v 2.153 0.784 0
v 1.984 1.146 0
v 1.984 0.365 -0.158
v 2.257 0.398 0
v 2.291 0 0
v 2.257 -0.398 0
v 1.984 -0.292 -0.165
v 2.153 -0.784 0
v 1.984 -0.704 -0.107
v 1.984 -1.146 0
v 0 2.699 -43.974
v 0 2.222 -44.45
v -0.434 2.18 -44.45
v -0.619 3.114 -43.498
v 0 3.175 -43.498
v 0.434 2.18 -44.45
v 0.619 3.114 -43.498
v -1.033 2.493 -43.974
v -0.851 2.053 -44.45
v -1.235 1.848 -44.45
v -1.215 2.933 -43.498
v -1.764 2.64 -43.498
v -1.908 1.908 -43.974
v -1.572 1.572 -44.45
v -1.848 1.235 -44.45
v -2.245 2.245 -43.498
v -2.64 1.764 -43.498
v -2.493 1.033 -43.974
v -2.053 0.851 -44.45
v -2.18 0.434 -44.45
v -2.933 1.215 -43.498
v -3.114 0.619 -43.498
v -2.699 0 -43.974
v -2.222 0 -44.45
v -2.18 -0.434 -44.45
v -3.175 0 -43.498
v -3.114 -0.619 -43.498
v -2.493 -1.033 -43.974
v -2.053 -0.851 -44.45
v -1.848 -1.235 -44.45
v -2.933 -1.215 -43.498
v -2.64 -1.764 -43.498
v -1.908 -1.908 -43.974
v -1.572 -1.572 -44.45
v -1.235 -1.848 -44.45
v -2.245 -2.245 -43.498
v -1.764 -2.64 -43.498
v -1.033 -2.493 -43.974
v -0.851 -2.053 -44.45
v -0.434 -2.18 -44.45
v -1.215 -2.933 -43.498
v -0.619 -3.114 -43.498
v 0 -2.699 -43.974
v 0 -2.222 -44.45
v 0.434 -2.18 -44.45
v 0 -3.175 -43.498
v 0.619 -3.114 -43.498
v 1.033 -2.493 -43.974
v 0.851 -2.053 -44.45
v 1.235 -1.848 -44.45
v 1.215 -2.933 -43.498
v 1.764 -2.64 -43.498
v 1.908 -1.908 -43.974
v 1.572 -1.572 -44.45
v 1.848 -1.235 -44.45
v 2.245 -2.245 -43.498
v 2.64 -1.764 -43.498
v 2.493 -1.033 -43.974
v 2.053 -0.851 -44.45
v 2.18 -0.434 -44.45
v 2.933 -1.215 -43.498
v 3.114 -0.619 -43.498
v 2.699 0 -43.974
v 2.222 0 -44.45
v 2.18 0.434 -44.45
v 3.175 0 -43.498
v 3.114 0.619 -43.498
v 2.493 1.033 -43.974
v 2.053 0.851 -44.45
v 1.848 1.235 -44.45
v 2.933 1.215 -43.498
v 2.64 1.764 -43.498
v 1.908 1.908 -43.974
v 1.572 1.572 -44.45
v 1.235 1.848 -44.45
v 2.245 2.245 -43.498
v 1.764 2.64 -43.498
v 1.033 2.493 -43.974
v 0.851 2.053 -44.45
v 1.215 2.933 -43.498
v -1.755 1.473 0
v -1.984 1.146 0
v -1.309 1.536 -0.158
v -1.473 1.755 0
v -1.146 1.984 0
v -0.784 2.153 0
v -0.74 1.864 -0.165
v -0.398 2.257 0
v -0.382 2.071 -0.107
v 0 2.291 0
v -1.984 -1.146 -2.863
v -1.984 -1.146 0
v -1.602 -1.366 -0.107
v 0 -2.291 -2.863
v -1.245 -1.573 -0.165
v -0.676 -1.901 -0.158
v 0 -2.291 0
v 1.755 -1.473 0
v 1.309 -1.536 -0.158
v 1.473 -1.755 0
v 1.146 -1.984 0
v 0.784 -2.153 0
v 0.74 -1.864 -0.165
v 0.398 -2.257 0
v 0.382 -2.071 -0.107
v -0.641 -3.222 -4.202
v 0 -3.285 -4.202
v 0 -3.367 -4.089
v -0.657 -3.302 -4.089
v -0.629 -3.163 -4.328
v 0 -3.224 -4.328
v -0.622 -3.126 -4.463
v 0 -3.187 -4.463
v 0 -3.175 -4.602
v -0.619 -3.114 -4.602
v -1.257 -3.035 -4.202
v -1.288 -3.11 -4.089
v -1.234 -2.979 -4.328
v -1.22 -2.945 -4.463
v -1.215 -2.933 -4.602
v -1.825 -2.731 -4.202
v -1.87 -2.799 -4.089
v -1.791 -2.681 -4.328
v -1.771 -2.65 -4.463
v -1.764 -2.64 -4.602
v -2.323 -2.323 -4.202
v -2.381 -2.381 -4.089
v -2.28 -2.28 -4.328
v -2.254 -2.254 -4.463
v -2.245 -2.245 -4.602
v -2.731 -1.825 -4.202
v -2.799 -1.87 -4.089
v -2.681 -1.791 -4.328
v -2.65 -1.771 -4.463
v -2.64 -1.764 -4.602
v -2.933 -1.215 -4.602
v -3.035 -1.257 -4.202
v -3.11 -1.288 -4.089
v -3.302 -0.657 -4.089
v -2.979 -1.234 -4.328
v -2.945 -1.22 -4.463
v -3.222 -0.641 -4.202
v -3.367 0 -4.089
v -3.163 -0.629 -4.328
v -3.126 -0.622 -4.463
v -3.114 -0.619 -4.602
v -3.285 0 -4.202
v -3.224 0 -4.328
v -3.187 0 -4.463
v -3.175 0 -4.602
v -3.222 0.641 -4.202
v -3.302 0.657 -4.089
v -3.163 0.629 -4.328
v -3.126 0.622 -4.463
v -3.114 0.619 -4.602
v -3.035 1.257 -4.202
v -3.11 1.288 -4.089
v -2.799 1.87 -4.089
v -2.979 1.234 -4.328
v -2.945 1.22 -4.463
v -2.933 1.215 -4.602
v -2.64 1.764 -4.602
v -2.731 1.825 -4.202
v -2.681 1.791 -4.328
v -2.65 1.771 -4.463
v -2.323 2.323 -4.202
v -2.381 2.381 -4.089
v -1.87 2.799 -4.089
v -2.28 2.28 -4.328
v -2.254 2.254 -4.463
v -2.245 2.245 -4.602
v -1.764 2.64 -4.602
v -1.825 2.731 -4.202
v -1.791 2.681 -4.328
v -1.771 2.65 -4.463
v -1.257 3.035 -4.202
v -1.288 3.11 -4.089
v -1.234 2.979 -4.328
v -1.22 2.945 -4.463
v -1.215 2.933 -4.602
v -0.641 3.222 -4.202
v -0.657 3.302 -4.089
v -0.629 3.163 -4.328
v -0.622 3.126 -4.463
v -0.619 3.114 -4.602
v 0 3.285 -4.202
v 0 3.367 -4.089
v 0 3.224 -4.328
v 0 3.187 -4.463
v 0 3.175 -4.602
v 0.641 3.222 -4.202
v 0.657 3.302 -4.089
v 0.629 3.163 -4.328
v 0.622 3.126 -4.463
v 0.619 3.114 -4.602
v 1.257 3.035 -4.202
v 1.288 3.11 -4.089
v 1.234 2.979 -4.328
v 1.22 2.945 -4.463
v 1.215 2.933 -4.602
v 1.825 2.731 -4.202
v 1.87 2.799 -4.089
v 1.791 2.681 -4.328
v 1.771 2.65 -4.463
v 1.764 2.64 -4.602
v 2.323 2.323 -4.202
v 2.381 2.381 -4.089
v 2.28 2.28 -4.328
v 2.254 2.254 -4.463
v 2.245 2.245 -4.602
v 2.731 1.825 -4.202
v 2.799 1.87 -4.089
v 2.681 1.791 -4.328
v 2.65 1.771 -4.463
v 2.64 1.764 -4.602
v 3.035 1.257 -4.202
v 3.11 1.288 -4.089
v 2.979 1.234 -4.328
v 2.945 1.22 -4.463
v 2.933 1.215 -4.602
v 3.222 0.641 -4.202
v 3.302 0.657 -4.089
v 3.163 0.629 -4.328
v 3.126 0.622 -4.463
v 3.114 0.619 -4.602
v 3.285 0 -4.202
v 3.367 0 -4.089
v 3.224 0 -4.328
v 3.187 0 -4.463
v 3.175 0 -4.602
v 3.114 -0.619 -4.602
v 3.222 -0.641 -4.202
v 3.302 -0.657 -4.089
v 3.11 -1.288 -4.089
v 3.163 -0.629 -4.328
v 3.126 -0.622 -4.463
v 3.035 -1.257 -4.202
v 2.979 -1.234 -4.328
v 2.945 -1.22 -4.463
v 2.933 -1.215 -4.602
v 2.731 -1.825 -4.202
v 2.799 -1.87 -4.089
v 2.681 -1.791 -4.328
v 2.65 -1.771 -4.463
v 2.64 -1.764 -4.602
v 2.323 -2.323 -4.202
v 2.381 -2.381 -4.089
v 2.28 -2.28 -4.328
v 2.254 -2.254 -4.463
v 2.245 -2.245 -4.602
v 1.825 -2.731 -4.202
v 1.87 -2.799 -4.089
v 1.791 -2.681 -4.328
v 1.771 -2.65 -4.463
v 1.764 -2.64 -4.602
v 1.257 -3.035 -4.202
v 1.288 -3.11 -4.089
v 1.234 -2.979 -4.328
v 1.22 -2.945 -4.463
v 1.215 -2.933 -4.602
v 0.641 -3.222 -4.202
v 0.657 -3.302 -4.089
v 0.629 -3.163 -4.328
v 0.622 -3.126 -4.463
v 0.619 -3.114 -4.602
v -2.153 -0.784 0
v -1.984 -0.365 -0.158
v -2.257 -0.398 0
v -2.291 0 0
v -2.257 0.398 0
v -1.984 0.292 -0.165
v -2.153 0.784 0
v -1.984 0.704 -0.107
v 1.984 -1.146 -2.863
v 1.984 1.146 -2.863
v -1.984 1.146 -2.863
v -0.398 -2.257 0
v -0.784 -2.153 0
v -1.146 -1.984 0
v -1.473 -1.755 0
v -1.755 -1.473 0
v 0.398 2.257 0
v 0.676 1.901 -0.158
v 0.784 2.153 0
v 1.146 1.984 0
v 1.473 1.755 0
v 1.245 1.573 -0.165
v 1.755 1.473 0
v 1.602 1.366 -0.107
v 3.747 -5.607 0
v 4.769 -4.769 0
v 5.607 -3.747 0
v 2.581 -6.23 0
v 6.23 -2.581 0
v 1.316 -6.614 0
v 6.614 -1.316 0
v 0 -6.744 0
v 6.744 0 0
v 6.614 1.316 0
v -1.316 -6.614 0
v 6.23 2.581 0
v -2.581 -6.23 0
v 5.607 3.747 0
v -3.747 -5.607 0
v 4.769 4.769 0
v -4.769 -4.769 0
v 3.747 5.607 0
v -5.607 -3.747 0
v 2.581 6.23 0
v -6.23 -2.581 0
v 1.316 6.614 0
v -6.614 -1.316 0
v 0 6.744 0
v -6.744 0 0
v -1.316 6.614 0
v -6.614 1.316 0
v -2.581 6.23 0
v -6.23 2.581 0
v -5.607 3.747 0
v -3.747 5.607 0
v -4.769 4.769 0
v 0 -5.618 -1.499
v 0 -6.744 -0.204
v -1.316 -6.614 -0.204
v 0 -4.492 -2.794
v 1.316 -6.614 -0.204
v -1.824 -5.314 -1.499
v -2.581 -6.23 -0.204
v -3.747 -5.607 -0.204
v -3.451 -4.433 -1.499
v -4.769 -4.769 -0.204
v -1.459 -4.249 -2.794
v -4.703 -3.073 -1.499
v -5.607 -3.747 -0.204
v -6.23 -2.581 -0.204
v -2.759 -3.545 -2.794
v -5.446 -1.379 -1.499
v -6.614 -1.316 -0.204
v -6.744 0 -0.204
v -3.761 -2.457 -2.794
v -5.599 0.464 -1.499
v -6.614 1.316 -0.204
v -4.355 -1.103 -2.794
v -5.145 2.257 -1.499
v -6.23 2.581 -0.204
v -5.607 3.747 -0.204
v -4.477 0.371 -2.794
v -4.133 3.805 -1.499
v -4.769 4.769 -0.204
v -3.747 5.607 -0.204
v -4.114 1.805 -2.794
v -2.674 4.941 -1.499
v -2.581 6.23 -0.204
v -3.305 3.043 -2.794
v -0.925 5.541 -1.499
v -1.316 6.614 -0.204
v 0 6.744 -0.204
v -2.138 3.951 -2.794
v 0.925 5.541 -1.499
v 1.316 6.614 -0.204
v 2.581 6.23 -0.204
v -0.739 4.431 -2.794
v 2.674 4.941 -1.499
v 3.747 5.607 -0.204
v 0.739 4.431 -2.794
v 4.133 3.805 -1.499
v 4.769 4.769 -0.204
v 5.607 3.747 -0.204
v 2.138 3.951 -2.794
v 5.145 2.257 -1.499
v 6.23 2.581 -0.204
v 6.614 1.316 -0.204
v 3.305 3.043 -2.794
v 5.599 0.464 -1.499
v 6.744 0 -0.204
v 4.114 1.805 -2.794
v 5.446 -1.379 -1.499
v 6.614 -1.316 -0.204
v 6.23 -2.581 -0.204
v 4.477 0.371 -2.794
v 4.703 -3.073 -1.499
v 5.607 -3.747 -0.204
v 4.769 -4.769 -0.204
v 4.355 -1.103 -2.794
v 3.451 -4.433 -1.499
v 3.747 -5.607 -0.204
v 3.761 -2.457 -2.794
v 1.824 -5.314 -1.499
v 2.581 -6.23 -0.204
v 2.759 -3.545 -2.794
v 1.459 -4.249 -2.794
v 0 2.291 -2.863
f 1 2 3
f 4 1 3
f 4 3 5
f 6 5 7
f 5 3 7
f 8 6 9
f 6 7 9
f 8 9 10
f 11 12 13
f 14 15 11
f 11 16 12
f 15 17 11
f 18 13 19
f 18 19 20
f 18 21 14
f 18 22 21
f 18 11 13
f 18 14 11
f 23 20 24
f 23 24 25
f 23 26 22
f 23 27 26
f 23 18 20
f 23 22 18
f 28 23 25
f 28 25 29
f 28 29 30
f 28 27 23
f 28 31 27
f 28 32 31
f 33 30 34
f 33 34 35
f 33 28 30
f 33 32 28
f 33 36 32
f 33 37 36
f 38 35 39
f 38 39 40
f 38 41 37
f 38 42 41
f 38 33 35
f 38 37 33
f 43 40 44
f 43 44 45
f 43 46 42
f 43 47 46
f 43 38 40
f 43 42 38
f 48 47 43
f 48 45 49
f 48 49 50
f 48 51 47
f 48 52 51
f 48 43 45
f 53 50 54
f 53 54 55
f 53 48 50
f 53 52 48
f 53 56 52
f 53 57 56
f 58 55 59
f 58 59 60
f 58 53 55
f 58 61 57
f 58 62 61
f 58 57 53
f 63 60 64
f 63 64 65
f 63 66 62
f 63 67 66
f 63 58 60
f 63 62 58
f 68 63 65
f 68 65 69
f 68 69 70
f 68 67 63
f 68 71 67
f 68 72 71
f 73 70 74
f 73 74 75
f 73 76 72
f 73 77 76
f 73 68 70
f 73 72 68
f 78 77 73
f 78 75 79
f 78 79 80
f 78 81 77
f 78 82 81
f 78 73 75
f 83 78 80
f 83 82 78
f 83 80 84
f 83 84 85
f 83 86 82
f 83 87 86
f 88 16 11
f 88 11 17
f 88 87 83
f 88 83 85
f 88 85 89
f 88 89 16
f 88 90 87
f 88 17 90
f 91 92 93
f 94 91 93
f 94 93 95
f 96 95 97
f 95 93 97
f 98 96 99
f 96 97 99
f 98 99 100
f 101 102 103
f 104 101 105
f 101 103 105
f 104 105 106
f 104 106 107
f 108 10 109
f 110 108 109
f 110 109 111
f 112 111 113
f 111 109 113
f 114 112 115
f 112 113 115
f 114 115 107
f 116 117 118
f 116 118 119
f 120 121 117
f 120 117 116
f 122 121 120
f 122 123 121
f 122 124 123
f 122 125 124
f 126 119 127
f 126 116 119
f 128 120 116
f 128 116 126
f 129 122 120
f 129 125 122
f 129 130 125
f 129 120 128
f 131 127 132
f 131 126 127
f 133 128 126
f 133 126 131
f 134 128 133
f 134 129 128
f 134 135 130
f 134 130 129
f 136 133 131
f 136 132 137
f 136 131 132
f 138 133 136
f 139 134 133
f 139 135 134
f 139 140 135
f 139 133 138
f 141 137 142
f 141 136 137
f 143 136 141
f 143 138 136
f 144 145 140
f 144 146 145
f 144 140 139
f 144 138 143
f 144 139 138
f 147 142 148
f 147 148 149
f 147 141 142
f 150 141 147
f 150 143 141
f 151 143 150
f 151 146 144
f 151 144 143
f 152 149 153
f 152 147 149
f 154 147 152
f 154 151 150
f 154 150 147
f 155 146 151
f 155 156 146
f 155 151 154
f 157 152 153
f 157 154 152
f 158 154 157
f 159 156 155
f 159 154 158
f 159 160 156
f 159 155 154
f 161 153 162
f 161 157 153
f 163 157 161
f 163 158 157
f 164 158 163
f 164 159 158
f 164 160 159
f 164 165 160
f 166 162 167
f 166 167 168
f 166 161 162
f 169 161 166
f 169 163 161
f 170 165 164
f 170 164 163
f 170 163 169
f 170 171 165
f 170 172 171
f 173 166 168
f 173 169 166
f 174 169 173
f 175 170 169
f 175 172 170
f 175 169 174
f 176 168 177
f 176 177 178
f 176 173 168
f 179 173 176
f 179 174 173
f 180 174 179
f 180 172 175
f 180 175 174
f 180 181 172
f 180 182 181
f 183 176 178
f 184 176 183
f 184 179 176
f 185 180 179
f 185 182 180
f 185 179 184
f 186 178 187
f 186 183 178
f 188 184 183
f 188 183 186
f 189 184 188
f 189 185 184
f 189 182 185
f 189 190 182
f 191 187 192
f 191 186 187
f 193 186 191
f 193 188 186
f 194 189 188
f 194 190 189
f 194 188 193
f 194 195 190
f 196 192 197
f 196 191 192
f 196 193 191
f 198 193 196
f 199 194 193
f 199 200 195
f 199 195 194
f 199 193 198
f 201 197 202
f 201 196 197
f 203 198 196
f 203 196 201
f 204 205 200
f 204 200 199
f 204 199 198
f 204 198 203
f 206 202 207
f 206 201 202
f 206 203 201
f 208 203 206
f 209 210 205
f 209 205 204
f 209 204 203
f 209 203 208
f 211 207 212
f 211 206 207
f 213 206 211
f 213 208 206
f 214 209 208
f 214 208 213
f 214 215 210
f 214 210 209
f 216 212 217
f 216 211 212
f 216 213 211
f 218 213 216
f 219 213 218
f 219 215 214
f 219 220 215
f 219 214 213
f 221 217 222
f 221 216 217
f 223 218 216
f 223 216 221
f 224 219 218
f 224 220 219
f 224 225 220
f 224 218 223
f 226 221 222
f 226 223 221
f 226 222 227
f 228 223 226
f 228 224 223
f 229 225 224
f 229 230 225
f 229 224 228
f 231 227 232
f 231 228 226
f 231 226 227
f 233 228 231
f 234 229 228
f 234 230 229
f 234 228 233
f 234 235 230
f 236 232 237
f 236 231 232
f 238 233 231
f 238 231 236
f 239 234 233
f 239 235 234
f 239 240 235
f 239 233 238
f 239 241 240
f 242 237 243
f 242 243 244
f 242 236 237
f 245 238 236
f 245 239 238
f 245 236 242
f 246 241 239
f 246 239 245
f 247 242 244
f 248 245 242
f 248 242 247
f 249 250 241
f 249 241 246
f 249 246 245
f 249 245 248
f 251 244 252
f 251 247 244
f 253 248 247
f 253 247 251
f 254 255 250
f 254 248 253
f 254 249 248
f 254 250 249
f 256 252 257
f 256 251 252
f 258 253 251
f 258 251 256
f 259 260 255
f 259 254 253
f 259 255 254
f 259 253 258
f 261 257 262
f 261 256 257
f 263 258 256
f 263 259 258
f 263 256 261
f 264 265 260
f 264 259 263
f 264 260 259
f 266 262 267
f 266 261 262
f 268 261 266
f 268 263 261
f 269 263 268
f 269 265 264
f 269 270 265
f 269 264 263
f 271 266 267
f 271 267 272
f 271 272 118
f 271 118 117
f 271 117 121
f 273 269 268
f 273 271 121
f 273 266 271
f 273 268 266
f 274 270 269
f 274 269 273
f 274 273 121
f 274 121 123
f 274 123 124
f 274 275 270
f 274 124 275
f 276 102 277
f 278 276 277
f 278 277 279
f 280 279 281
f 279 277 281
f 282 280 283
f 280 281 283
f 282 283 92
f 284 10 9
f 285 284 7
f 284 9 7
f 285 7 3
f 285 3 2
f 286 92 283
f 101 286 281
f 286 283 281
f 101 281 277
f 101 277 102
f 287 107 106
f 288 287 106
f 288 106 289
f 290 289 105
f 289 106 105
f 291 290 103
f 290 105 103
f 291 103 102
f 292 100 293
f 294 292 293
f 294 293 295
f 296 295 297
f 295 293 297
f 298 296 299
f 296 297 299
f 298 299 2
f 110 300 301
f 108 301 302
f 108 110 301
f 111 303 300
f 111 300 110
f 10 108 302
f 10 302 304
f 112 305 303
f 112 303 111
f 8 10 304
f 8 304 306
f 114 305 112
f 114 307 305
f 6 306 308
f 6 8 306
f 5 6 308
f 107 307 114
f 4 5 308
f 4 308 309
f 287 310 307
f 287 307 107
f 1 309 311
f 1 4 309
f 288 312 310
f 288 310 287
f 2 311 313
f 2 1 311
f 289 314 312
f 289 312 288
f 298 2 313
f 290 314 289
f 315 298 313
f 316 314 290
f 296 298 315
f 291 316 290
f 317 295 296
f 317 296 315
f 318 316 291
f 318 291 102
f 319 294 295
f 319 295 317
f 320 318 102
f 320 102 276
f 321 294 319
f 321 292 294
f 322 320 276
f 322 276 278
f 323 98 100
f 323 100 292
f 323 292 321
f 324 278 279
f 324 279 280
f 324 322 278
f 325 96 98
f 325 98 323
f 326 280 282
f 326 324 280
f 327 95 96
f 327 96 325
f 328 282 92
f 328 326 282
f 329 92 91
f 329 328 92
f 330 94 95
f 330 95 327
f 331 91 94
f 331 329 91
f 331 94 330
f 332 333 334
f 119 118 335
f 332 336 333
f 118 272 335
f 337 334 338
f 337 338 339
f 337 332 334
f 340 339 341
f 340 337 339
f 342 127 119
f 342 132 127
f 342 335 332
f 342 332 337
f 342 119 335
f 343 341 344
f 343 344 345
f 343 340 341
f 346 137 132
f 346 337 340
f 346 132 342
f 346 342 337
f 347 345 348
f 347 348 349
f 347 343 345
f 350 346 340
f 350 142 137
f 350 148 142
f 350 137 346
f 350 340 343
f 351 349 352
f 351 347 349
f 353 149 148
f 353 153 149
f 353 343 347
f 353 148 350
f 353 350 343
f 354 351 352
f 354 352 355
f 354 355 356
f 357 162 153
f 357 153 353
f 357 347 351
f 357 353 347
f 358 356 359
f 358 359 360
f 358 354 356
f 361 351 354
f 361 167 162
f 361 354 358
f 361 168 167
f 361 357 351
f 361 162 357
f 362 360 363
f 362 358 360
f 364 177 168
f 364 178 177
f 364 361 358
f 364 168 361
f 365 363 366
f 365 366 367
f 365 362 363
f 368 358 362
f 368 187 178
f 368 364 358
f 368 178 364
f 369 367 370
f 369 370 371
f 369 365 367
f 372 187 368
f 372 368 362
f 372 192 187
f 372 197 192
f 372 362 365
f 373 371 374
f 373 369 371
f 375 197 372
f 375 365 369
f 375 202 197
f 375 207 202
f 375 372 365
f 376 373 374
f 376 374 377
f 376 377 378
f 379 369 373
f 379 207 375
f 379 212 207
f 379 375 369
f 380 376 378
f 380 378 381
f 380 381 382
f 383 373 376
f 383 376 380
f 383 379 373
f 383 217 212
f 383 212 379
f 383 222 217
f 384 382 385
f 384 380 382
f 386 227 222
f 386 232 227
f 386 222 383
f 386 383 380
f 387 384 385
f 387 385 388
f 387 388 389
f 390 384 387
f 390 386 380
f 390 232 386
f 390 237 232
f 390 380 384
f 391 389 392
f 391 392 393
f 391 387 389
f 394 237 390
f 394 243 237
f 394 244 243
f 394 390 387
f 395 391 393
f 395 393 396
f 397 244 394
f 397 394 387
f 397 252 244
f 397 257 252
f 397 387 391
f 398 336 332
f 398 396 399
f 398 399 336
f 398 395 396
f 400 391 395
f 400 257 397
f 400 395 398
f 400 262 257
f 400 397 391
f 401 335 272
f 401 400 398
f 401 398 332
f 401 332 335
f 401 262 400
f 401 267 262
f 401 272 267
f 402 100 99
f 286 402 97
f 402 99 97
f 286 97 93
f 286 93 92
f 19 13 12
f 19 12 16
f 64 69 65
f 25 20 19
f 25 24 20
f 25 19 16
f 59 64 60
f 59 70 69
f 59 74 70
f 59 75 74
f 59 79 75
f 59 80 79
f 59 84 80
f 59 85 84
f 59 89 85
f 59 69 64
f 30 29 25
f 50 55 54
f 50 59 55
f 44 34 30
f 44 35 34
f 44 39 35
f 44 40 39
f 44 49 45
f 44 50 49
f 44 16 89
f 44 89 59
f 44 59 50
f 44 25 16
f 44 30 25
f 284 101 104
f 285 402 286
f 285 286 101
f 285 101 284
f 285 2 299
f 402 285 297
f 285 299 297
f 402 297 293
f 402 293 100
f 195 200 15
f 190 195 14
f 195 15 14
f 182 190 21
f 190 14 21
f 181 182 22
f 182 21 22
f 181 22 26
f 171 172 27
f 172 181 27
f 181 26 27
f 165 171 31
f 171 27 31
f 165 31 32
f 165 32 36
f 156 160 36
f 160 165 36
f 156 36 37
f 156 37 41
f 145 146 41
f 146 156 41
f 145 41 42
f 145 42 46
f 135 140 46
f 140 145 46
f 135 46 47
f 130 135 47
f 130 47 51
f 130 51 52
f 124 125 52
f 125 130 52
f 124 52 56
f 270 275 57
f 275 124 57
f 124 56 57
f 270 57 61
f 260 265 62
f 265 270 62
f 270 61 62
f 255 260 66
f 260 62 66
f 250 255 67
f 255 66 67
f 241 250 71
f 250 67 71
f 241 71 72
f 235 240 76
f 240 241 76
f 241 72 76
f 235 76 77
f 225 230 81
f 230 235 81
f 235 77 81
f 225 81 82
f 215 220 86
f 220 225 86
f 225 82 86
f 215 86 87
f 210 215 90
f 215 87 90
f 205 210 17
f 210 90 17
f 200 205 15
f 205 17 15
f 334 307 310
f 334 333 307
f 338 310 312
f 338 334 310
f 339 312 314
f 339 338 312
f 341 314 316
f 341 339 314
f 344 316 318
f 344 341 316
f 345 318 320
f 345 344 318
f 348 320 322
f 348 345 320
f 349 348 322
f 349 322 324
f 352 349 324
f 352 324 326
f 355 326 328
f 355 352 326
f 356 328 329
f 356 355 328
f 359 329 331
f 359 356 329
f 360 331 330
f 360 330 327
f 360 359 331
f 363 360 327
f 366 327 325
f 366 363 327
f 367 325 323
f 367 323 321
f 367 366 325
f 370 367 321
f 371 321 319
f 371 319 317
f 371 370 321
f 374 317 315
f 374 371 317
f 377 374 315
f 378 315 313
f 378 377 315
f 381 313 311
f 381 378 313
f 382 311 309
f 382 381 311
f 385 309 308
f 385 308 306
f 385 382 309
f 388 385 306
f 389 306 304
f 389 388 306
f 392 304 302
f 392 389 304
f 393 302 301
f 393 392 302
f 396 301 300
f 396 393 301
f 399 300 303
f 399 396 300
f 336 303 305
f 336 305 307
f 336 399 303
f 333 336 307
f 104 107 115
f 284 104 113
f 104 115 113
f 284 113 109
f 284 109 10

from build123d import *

# Parameters (mm, degrees)
SKETCH1_W           = 44.45
SKETCH1_H           = 3.175
CHAMFER1_SIZE       = 0.9525
CUT_EXTRUDE2_DEPTH  = 2.86258
BOSS_EXTRUDE2_START = -17.623191003
SKETCH9_R           = 3.175
BOSS_EXTRUDE2_DEPTH = 17.623191003


with BuildPart() as part:
    # Sketch1 → Revolve1 (revolve)
    with BuildSketch(Plane(origin=(0, 0, 0), x_dir=(0, 0, -1), z_dir=(1, 0, 0))):
        with Locations((22.225, 1.5875)):
            Rectangle(SKETCH1_W, SKETCH1_H)
    revolve(axis=Axis((0, 0, -44.45), (0, 0, 1)))

    # Chamfer1
    chamfer1_edges = [part.edges().sort_by_distance(p)[0] for p in [
        (0, -3.175, -44.45),
    ]]
    chamfer(chamfer1_edges, length=CHAMFER1_SIZE)

    # Sketch7 → Revolve2 (revolve)
    with BuildSketch(Plane(origin=(0, 0, 0), x_dir=(0, 0, -1), z_dir=(1, 0, 0)), mode=Mode.PRIVATE) as revolve2_sk:
        with BuildLine():
            Line((0, 6.7437), (0.20447, 6.7437))
            Line((0.20447, 6.7437), (4.0894, 3.366581874))
            ThreePointArc((4.0894, 3.366581874), (4.328282675, 3.224461616), (4.601808997, 3.175))
            Line((4.601808997, 3.175), (4.601808997, 0))
            Line((4.601808997, 0), (0, 0))
            Line((0, 0), (0, 6.7437))
        make_face()
    revolve(revolve2_sk.sketch.rotate(Axis((0, 0, 0), (0, 0, -1)), 180), axis=Axis((0, 0, 0), (0, 0, -1)))

    # Boss-Extrude1 cone 1 section (through the dimple's axis) → Boss-Extrude1 (revolve)
    with BuildSketch(Plane(origin=(0, 0, -4.601808997), x_dir=(0, -1, 0), z_dir=(1, 0, 0))):
        Polygon((0, 0), (3.175, 0), (0, 3.06606186), align=None)
    revolve(axis=Axis((0, 0, -4.601808997), (0, 0, -1)))

    # Sketch5 → Cut-Extrude2 (cut)
    with BuildSketch(Plane.XY):
        Polygon((0, 2.291358881), (-1.984375, 1.14567944), (-1.984375, -1.14567944), (0, -2.291358881), (1.984375, -1.14567944), (1.984375, 1.14567944), align=None)
    extrude(amount=-CUT_EXTRUDE2_DEPTH, mode=Mode.SUBTRACT)

    # Cut-Extrude3 cone 1 section (through the dimple's axis) → Cut-Extrude3 (revolve, cut)
    with BuildSketch(Plane(origin=(0, 0, 0), x_dir=(0, -1, 0), z_dir=(1, 0, 0))):
        Polygon((0, 0), (2.291358881, 0), (0, 1.322916667), align=None)
    revolve(axis=Axis((0, 0, 0), (0, 0, -1)), mode=Mode.SUBTRACT)

    # Sketch9 → Boss-Extrude2 (add)
    with BuildSketch(Plane.XY.offset(-4.601808997).offset(BOSS_EXTRUDE2_START)):
        with Locations(Location((0, 0, 0), (0, 0, 90))):
            Circle(SKETCH9_R)
    extrude(amount=BOSS_EXTRUDE2_DEPTH)


solid = part.part
